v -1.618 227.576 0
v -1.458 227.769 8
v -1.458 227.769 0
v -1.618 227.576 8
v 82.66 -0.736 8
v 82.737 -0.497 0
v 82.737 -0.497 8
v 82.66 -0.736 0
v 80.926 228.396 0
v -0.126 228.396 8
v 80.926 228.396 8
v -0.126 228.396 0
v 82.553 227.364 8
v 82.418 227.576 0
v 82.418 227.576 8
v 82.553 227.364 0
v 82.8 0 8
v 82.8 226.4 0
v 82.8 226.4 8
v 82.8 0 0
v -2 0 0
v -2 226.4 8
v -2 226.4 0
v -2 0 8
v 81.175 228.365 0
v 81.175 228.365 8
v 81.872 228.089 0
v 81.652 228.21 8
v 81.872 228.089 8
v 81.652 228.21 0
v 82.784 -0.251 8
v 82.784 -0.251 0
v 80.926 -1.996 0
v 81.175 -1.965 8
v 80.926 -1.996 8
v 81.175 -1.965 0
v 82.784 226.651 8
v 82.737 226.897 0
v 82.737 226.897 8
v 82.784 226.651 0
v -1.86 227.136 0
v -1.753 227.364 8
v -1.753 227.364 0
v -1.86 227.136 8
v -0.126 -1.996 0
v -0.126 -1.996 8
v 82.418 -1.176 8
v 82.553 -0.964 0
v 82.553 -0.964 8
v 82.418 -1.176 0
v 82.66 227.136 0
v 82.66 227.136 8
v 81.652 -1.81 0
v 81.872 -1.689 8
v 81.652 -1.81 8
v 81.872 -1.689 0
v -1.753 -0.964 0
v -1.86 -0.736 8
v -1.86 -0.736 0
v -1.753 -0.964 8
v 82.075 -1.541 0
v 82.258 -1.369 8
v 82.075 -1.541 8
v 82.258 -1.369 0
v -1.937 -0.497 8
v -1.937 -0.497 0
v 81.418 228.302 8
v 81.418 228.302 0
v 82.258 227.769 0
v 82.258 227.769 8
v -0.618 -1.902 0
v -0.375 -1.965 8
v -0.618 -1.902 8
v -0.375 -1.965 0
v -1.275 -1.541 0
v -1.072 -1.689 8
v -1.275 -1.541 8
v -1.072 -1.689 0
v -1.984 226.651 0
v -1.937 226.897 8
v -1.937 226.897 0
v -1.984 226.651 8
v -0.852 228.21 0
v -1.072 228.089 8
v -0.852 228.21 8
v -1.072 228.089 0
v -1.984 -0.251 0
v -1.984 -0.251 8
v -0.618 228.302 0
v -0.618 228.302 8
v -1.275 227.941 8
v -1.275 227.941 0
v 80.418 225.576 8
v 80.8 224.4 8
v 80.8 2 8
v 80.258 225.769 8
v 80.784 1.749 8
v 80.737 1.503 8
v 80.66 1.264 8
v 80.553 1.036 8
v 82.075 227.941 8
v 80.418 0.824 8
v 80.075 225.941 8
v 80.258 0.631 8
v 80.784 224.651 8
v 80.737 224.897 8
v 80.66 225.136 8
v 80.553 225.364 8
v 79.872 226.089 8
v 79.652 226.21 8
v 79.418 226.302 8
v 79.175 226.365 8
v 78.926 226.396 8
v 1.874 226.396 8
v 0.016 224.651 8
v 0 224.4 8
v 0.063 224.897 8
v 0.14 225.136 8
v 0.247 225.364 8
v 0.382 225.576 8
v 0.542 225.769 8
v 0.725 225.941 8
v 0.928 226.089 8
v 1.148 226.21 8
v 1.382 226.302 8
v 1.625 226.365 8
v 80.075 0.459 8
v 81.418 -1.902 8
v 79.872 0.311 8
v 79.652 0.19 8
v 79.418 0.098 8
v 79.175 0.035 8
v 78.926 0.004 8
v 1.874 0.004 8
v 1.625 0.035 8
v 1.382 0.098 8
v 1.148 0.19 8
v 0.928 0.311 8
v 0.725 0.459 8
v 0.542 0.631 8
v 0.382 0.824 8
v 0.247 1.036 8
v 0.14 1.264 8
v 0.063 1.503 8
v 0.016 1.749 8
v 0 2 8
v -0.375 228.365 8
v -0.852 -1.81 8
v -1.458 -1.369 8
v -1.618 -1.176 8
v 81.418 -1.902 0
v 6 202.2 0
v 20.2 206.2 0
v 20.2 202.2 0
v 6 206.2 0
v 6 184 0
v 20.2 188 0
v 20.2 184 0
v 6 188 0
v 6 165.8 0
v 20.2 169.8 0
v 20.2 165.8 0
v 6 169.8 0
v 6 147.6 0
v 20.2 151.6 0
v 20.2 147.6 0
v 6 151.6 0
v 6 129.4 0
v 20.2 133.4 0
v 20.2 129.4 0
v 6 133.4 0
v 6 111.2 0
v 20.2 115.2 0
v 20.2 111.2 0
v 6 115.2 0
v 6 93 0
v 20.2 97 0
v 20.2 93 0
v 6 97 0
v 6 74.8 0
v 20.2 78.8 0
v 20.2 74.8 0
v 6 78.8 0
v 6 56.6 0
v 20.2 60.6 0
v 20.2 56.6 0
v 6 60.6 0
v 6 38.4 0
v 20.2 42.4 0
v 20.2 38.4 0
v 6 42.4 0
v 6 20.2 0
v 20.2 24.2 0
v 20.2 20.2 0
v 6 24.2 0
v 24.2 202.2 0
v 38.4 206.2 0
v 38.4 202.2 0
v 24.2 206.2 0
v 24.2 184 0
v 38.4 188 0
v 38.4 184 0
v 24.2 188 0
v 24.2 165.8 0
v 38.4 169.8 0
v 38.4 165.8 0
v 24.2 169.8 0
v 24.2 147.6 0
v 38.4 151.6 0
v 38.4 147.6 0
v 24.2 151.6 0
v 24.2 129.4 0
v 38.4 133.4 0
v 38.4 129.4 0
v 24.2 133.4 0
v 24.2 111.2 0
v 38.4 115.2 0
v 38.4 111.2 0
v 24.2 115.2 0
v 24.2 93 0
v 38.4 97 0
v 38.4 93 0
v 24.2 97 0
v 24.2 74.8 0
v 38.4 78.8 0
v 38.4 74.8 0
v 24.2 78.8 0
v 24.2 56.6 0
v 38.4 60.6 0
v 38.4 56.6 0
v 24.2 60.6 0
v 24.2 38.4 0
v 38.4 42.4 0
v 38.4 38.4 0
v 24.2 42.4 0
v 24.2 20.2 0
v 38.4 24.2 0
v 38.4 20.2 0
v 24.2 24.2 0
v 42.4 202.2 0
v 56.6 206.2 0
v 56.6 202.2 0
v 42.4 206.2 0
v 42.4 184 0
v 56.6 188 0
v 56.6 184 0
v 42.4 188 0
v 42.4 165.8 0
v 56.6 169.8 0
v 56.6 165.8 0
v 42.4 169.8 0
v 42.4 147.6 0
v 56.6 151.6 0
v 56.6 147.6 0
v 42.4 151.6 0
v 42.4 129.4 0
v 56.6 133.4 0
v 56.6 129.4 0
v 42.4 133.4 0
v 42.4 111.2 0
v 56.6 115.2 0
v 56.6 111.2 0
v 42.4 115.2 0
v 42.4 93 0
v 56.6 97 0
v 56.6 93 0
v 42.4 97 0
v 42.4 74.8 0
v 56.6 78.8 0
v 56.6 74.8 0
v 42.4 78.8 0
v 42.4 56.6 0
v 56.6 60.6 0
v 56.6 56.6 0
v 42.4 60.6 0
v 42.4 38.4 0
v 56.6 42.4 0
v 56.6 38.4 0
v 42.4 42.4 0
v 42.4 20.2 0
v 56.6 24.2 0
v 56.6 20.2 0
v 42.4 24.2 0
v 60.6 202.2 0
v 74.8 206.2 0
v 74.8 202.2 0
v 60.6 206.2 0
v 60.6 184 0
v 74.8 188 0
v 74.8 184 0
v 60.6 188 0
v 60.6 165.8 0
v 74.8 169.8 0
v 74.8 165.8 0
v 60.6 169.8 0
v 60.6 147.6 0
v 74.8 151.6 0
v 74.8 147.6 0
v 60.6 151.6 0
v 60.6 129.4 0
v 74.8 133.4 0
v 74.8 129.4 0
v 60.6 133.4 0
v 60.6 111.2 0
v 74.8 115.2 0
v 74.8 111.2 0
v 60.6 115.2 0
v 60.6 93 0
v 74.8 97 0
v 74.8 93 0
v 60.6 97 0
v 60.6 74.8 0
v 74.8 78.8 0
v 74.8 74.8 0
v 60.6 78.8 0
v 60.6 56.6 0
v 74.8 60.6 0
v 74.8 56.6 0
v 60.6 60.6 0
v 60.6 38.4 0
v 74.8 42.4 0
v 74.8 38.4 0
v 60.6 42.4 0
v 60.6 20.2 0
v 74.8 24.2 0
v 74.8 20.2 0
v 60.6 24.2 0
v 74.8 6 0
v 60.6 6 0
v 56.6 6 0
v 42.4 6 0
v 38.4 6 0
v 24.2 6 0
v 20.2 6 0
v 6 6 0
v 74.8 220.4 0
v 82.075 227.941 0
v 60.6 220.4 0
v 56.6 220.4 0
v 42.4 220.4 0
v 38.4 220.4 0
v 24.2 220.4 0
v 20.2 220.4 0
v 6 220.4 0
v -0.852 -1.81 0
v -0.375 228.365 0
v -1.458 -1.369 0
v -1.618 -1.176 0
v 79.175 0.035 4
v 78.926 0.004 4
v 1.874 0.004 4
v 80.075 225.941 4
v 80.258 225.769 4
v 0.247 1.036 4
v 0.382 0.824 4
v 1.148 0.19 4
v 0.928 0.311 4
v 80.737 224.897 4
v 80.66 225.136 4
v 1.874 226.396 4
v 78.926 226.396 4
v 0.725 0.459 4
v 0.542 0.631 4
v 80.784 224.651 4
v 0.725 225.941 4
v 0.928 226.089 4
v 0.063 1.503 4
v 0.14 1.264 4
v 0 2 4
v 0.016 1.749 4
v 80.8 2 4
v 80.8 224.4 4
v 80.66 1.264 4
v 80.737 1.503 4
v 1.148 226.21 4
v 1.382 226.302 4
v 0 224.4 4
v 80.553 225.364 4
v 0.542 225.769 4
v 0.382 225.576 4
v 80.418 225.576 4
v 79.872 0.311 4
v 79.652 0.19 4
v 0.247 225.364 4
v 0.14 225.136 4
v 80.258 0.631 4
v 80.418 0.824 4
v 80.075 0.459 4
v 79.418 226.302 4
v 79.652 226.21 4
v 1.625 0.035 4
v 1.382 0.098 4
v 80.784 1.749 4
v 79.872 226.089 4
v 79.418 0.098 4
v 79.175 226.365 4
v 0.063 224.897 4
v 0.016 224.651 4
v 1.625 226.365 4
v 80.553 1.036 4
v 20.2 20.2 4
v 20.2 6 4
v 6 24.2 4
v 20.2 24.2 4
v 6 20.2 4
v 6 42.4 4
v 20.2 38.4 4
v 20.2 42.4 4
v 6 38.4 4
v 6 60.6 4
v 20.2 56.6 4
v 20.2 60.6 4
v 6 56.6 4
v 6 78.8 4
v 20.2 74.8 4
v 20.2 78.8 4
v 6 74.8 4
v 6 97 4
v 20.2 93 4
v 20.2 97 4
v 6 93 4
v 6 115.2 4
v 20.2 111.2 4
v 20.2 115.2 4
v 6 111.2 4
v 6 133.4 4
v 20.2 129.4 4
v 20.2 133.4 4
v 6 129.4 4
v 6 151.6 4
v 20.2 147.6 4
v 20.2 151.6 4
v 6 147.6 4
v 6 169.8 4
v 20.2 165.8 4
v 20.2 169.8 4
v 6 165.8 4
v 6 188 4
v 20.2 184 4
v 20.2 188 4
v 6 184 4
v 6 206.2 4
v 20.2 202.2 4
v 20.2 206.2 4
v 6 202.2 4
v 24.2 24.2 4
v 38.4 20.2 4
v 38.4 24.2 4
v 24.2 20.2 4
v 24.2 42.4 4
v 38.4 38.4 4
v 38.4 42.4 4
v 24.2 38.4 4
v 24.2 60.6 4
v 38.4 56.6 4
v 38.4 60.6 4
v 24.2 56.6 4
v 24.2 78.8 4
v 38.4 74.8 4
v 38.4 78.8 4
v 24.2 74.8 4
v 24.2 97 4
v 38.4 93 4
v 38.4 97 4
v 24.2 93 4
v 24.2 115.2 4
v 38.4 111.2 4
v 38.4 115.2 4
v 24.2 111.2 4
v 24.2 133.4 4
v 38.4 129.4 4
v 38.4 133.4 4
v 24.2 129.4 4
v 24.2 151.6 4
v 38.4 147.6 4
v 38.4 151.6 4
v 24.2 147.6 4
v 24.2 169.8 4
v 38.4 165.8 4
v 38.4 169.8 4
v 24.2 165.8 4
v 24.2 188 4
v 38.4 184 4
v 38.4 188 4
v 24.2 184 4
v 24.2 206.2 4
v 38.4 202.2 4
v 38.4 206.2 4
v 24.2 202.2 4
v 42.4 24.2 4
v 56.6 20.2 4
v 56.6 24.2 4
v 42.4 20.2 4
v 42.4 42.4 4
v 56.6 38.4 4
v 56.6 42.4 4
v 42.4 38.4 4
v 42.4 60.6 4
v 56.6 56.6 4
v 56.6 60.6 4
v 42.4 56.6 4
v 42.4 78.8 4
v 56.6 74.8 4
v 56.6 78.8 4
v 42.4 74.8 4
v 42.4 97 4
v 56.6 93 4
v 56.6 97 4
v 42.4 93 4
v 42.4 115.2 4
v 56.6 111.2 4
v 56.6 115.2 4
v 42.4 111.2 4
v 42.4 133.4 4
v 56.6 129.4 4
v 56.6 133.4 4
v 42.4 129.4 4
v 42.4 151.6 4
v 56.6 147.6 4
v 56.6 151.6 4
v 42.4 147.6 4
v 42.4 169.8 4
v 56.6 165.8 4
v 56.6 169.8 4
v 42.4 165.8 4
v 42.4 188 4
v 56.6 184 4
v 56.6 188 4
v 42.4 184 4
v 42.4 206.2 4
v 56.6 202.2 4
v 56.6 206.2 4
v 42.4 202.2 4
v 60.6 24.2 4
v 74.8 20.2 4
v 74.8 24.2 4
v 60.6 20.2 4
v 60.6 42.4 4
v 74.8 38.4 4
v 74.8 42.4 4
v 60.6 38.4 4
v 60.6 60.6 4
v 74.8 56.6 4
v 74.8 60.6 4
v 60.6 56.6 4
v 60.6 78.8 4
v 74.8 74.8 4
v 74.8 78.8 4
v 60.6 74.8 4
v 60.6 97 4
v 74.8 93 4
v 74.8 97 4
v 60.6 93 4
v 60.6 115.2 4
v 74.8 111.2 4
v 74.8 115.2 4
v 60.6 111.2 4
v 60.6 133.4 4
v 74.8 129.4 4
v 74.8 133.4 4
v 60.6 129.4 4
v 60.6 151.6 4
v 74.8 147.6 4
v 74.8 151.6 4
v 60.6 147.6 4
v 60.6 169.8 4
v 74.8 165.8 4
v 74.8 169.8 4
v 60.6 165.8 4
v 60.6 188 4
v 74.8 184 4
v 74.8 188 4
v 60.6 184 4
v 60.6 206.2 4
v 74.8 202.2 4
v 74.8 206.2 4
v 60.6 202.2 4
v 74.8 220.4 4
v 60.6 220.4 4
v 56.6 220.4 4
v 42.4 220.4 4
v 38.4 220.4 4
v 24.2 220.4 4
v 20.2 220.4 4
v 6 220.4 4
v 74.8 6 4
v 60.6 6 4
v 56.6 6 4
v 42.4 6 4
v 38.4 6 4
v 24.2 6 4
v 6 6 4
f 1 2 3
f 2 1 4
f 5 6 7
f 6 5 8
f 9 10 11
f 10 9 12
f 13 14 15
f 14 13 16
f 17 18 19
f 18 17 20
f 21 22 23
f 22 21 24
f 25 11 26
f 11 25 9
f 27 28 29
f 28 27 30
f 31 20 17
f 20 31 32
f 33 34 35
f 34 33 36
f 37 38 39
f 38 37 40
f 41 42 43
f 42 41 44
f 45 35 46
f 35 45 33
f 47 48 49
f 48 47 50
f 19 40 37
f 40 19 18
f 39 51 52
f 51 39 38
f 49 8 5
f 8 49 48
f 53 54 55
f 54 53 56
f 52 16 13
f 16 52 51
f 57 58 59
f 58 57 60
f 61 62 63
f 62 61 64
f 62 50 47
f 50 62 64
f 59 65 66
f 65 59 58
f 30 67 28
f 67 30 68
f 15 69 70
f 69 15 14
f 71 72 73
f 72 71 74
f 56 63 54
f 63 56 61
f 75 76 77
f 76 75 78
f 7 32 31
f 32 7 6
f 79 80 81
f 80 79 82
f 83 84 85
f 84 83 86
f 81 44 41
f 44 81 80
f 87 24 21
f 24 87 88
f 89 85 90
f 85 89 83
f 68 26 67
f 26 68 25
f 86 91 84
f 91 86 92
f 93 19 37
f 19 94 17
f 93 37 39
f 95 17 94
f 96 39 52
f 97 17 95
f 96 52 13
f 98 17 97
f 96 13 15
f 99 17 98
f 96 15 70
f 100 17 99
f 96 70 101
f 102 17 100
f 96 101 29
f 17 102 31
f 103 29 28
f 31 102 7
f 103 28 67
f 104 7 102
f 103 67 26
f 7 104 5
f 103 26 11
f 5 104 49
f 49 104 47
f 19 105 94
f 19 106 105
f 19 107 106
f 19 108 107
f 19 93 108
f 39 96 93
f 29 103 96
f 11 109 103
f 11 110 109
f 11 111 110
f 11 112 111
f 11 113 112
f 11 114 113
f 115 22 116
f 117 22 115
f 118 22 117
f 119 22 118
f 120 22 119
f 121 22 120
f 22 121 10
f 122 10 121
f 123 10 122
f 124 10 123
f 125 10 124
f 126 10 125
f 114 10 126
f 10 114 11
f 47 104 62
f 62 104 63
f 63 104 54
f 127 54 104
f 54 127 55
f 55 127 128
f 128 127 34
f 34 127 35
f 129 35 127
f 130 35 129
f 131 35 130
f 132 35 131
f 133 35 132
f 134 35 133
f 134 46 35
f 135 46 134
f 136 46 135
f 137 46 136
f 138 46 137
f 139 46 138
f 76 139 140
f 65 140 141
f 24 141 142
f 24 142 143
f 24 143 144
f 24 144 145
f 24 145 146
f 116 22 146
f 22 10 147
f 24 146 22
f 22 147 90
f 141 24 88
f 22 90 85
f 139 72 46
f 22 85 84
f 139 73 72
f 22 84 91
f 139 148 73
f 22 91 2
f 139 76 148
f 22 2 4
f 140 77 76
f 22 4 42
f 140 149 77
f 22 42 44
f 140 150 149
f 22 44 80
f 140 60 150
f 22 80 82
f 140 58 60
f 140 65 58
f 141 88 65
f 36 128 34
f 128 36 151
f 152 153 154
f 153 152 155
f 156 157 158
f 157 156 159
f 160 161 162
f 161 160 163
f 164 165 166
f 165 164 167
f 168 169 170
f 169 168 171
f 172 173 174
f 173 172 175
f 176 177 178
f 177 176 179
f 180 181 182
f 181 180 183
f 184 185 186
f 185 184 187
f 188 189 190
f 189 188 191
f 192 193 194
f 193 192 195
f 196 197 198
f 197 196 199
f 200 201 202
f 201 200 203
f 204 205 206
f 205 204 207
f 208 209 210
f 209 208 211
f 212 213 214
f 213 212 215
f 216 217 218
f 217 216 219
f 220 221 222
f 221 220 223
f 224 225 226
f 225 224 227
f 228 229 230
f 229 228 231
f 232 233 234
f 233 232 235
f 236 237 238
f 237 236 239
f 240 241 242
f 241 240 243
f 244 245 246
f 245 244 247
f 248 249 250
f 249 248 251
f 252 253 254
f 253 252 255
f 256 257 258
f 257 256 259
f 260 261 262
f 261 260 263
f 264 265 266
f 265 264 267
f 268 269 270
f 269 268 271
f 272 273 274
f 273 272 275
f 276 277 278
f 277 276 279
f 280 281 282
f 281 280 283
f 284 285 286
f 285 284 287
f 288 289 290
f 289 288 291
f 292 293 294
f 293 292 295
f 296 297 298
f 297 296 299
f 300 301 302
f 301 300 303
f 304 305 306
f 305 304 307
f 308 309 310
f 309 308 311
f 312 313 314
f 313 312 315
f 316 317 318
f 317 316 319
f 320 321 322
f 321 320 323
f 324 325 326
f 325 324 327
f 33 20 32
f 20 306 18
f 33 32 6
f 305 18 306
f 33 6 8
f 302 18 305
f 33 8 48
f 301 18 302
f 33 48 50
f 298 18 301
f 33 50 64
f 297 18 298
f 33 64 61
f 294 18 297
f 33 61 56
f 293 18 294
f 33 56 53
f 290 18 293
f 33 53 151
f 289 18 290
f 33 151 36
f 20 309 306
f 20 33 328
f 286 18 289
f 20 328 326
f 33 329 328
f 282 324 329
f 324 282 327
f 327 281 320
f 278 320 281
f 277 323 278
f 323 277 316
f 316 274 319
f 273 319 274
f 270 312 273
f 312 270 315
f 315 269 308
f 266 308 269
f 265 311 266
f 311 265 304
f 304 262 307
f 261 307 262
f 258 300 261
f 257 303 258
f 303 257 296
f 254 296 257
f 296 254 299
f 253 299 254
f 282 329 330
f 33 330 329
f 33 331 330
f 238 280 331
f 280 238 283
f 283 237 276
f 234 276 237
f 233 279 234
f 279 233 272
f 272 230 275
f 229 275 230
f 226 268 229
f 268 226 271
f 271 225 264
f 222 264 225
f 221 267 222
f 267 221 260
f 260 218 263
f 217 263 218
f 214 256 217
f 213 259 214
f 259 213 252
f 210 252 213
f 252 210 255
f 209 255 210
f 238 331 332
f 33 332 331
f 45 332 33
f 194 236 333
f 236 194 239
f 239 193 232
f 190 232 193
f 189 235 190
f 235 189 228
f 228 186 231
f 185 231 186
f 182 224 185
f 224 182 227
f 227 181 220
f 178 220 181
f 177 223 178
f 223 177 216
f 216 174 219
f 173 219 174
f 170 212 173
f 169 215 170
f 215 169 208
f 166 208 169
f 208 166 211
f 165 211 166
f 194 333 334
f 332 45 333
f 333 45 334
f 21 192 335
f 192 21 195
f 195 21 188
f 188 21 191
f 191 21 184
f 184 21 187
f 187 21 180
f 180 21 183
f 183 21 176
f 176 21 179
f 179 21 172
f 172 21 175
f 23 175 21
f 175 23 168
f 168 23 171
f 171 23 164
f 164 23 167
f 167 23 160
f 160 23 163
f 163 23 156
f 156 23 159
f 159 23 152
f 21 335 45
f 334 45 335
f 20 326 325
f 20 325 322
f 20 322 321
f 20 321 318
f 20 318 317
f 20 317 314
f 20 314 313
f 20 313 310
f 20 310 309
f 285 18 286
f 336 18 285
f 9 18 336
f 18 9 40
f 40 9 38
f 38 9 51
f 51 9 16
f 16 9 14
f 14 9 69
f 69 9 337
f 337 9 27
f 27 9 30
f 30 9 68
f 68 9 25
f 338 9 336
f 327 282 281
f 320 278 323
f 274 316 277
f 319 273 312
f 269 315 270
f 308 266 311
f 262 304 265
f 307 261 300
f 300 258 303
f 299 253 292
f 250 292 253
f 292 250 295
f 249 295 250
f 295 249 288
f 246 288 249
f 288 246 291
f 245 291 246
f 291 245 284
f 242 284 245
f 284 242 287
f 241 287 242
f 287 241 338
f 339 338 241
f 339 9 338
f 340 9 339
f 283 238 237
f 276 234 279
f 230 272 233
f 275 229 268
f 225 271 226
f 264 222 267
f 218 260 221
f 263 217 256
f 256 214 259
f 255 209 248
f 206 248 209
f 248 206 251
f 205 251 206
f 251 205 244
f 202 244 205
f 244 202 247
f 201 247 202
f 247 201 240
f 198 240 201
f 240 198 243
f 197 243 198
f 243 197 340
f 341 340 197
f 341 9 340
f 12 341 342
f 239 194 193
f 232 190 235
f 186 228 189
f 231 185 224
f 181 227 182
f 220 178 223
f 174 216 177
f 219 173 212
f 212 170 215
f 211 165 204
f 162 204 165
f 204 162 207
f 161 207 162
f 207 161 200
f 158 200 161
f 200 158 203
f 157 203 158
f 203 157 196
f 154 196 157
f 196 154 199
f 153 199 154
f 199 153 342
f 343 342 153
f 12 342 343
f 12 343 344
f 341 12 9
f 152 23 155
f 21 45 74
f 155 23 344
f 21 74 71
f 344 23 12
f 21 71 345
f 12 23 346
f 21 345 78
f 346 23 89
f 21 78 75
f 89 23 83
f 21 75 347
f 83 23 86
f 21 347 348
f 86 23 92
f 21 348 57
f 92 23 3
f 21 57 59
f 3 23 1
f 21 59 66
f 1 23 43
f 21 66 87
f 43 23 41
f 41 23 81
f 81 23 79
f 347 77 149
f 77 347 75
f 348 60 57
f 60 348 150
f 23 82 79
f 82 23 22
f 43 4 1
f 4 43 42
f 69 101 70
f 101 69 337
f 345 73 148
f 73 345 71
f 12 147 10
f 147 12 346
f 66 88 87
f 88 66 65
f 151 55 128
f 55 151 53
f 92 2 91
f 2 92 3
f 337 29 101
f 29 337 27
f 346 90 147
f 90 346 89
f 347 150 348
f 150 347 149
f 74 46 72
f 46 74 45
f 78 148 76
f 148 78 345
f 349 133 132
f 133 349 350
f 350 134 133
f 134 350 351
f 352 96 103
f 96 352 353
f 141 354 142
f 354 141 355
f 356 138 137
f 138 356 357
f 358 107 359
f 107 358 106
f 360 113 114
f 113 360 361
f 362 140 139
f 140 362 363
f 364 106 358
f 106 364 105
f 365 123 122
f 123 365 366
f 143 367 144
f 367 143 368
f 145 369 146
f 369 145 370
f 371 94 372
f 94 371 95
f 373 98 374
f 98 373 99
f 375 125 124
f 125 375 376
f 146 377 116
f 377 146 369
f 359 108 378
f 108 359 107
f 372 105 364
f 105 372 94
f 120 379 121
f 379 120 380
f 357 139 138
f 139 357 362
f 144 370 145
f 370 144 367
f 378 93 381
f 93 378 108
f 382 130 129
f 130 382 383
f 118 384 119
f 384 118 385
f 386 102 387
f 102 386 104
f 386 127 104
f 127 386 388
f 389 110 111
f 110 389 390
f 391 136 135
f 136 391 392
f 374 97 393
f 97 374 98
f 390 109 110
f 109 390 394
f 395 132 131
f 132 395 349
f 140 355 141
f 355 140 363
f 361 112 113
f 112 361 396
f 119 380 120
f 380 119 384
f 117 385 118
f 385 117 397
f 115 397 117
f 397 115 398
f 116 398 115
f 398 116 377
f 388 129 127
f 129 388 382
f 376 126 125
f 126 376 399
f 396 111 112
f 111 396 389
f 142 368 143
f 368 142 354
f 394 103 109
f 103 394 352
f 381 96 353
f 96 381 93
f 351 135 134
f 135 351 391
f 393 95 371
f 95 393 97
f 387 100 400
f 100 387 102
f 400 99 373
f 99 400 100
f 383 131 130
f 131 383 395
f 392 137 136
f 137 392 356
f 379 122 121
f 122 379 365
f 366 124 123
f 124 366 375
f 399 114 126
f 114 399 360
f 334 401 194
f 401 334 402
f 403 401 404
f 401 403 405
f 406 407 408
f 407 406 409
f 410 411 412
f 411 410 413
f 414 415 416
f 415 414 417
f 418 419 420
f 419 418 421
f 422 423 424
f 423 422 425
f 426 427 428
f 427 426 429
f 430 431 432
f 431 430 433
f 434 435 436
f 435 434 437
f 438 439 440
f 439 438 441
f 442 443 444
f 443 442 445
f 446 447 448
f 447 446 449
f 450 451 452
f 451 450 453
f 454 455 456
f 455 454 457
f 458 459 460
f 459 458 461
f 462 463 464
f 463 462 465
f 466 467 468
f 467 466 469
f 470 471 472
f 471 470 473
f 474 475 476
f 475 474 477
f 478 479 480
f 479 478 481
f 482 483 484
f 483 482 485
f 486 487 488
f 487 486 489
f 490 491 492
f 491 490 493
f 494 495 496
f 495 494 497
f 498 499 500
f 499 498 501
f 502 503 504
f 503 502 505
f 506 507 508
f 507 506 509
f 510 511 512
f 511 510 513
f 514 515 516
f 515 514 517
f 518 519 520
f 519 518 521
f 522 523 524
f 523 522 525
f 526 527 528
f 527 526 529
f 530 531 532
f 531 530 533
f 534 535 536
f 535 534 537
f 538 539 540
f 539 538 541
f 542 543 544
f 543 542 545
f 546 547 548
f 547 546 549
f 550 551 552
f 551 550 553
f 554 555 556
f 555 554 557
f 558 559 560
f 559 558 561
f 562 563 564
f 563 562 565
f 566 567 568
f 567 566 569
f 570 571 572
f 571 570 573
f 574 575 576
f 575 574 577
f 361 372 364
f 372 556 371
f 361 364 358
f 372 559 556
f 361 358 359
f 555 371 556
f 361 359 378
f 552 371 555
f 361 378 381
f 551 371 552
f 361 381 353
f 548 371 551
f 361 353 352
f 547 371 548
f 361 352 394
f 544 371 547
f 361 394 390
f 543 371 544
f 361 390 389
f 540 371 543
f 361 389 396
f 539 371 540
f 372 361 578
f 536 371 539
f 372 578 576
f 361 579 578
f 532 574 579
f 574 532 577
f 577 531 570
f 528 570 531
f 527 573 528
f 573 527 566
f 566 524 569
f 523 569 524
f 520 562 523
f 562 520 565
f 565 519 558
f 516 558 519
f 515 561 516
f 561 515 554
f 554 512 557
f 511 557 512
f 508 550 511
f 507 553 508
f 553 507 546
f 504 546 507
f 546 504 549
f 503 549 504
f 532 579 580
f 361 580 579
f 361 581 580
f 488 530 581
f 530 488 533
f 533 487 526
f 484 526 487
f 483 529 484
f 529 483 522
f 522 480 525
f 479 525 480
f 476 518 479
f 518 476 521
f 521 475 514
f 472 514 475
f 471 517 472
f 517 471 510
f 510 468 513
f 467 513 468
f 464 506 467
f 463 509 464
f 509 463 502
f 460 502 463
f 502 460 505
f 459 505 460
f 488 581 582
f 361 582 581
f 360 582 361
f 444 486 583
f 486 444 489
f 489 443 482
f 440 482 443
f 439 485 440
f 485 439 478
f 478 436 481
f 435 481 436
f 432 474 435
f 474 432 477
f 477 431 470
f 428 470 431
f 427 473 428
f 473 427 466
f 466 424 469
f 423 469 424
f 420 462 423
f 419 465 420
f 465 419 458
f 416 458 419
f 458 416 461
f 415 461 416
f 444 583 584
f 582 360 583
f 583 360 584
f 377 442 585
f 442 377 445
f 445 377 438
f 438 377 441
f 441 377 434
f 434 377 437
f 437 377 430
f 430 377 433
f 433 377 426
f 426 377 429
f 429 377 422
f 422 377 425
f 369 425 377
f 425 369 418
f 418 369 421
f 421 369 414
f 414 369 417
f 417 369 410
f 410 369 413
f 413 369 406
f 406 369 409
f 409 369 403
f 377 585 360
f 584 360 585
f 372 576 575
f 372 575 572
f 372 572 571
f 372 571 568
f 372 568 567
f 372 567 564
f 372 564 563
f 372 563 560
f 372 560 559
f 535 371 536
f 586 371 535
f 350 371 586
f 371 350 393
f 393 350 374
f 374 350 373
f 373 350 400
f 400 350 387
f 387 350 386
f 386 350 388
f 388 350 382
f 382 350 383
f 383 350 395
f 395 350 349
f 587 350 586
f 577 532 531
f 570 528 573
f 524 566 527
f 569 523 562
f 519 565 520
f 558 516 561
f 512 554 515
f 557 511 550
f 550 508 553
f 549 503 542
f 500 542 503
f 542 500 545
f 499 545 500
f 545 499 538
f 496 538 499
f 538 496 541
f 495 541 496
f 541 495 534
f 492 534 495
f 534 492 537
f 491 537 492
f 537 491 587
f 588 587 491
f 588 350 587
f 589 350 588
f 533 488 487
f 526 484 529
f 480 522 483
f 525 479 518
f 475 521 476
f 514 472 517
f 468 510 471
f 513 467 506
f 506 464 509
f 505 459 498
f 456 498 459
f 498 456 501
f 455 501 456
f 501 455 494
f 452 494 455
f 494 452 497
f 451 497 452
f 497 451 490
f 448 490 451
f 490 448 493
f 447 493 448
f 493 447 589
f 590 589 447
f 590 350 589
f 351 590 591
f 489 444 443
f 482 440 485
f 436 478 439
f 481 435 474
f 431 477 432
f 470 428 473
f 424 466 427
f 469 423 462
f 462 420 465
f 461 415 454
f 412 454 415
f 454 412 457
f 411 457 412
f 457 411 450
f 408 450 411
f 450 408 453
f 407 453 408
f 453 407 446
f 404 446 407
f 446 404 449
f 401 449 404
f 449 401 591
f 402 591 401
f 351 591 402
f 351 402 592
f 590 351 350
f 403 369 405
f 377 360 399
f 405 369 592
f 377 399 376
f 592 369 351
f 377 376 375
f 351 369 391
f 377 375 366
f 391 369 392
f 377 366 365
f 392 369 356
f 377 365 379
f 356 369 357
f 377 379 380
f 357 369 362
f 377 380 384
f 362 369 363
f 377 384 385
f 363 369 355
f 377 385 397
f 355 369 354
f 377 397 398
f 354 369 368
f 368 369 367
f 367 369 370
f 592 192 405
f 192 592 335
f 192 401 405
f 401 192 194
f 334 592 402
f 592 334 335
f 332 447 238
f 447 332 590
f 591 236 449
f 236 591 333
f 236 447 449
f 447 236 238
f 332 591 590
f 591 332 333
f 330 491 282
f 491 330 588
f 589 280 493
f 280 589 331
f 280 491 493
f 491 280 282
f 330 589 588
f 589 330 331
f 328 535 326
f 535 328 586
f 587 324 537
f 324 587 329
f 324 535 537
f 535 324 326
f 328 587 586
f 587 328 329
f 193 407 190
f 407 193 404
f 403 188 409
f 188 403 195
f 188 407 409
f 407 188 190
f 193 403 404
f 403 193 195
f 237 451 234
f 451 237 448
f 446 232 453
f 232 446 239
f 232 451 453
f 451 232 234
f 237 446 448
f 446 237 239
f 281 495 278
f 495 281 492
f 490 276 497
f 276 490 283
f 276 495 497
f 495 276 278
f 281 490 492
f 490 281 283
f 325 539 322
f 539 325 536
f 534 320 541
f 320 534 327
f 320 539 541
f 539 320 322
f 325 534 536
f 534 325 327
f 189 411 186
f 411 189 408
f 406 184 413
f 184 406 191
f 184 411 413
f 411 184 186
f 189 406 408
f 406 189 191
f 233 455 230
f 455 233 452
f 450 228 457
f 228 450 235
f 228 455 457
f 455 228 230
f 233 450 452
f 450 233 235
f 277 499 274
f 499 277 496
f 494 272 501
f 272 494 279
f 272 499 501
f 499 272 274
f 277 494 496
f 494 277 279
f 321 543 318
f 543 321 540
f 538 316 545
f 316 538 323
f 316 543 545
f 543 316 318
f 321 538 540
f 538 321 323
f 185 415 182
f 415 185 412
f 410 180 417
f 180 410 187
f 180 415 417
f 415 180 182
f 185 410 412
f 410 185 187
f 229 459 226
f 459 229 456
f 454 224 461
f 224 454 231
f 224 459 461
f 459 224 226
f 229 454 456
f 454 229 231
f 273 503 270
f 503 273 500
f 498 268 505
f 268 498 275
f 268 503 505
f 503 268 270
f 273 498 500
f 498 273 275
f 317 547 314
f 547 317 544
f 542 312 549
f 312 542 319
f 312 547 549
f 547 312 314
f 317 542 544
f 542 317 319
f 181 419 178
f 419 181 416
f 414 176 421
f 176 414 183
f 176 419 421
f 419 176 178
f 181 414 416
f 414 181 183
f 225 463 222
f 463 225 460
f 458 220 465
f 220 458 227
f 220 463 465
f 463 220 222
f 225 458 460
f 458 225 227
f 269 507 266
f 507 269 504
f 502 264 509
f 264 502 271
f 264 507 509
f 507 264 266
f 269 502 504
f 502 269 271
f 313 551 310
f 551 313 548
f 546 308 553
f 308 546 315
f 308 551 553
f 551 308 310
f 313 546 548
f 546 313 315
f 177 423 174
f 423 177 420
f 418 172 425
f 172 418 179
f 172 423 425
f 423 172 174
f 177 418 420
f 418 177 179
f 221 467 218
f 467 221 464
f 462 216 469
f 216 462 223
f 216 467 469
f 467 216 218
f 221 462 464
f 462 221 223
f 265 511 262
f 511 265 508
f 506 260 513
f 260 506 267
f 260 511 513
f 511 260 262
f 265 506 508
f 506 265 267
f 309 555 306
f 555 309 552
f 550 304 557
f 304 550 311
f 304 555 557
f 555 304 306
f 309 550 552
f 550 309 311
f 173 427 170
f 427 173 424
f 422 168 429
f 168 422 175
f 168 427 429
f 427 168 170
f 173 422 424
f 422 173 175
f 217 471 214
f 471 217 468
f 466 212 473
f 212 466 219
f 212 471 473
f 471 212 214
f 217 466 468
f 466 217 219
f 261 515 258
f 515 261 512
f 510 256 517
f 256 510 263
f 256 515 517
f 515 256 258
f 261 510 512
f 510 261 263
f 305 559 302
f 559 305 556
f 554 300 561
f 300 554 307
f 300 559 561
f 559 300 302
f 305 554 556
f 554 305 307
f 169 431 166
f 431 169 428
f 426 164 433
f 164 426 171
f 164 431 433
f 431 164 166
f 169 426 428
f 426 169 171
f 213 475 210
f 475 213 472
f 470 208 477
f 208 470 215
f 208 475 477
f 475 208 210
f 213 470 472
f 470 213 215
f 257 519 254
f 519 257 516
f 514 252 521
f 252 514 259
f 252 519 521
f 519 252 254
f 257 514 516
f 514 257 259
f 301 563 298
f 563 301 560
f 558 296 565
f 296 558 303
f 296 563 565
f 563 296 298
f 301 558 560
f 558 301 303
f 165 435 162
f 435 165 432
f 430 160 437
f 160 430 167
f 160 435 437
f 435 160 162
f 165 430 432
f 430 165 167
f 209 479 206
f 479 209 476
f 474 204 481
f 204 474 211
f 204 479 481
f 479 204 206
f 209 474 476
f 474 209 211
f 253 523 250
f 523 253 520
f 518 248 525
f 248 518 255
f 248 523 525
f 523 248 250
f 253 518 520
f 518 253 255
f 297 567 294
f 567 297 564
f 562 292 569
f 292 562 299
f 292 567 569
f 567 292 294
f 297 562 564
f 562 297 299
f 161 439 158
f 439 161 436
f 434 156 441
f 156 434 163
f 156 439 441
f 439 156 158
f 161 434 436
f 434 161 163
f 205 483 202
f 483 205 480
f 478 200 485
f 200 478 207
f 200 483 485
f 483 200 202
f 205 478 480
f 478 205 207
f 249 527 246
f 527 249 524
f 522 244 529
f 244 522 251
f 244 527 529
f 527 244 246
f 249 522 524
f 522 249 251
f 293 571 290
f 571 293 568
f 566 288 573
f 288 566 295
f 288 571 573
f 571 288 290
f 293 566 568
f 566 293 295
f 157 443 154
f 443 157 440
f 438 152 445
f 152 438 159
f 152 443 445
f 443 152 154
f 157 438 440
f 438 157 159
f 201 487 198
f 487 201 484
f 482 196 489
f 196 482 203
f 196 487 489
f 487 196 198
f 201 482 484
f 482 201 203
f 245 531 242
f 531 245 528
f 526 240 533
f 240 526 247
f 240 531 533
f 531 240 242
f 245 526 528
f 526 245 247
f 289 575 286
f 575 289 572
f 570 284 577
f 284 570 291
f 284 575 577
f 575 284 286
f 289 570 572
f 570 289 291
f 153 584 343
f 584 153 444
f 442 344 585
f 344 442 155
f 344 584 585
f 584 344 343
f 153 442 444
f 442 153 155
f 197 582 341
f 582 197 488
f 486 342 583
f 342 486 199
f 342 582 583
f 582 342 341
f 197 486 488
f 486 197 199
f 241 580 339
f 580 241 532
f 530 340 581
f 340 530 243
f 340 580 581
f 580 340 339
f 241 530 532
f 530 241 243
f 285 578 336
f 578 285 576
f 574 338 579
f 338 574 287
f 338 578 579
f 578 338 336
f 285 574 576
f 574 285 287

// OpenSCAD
$fn=50;
plateZ=2;
rows=4;
columns=12;
switchSide = 14.2;
switchMargin = 4;
plateMargin=4;
plateBoxZ=4;
plateBoxThickness=2;

minkowskiCylinderRadius=2;


//plateW=columns*(switchSide + switchMargin)+2*plateMargin - switchMargin;
//plateH=rows*(switchSide + switchMargin)+2*plateMargin - switchMargin;

plateW=(columns*switchSide) + (columns-1)*switchMargin +2*plateMargin;
plateH=(rows*switchSide) + (rows-1)*switchMargin +2*plateMargin;

echo("plateW=", plateW, " plateH=", plateH);

module platePlane(){
minkowski()
{
  cube([plateH,plateW,plateZ]);
  cylinder(r=minkowskiCylinderRadius,h=plateZ);
}
}

module plateBox(){
    difference(){
        
        minkowski()
        {
          cube([plateH+plateBoxThickness*2,plateW+plateBoxThickness*2,plateBoxZ]);
          cylinder(r=minkowskiCylinderRadius,h=plateBoxZ);
        }
        
        translate([plateBoxThickness,plateBoxThickness,0])
        minkowski()
        {
          cube([plateH,plateW,plateBoxZ]);
          cylinder(r=minkowskiCylinderRadius,h=plateBoxZ);
        }
        
        
    }

}


module holes(){
for(i=[0:columns-1]){
    for(j=[0:rows-1]){
        translate([(switchSide+switchMargin)*j,(switchSide+switchMargin)*i,0])
        cube([switchSide,switchSide,4]);
    }
    
}
}


plateBox();
translate([plateBoxThickness,plateBoxThickness,0])
difference(){
    platePlane();
    translate([plateMargin,plateMargin,0])
    holes();
    }





 


   
